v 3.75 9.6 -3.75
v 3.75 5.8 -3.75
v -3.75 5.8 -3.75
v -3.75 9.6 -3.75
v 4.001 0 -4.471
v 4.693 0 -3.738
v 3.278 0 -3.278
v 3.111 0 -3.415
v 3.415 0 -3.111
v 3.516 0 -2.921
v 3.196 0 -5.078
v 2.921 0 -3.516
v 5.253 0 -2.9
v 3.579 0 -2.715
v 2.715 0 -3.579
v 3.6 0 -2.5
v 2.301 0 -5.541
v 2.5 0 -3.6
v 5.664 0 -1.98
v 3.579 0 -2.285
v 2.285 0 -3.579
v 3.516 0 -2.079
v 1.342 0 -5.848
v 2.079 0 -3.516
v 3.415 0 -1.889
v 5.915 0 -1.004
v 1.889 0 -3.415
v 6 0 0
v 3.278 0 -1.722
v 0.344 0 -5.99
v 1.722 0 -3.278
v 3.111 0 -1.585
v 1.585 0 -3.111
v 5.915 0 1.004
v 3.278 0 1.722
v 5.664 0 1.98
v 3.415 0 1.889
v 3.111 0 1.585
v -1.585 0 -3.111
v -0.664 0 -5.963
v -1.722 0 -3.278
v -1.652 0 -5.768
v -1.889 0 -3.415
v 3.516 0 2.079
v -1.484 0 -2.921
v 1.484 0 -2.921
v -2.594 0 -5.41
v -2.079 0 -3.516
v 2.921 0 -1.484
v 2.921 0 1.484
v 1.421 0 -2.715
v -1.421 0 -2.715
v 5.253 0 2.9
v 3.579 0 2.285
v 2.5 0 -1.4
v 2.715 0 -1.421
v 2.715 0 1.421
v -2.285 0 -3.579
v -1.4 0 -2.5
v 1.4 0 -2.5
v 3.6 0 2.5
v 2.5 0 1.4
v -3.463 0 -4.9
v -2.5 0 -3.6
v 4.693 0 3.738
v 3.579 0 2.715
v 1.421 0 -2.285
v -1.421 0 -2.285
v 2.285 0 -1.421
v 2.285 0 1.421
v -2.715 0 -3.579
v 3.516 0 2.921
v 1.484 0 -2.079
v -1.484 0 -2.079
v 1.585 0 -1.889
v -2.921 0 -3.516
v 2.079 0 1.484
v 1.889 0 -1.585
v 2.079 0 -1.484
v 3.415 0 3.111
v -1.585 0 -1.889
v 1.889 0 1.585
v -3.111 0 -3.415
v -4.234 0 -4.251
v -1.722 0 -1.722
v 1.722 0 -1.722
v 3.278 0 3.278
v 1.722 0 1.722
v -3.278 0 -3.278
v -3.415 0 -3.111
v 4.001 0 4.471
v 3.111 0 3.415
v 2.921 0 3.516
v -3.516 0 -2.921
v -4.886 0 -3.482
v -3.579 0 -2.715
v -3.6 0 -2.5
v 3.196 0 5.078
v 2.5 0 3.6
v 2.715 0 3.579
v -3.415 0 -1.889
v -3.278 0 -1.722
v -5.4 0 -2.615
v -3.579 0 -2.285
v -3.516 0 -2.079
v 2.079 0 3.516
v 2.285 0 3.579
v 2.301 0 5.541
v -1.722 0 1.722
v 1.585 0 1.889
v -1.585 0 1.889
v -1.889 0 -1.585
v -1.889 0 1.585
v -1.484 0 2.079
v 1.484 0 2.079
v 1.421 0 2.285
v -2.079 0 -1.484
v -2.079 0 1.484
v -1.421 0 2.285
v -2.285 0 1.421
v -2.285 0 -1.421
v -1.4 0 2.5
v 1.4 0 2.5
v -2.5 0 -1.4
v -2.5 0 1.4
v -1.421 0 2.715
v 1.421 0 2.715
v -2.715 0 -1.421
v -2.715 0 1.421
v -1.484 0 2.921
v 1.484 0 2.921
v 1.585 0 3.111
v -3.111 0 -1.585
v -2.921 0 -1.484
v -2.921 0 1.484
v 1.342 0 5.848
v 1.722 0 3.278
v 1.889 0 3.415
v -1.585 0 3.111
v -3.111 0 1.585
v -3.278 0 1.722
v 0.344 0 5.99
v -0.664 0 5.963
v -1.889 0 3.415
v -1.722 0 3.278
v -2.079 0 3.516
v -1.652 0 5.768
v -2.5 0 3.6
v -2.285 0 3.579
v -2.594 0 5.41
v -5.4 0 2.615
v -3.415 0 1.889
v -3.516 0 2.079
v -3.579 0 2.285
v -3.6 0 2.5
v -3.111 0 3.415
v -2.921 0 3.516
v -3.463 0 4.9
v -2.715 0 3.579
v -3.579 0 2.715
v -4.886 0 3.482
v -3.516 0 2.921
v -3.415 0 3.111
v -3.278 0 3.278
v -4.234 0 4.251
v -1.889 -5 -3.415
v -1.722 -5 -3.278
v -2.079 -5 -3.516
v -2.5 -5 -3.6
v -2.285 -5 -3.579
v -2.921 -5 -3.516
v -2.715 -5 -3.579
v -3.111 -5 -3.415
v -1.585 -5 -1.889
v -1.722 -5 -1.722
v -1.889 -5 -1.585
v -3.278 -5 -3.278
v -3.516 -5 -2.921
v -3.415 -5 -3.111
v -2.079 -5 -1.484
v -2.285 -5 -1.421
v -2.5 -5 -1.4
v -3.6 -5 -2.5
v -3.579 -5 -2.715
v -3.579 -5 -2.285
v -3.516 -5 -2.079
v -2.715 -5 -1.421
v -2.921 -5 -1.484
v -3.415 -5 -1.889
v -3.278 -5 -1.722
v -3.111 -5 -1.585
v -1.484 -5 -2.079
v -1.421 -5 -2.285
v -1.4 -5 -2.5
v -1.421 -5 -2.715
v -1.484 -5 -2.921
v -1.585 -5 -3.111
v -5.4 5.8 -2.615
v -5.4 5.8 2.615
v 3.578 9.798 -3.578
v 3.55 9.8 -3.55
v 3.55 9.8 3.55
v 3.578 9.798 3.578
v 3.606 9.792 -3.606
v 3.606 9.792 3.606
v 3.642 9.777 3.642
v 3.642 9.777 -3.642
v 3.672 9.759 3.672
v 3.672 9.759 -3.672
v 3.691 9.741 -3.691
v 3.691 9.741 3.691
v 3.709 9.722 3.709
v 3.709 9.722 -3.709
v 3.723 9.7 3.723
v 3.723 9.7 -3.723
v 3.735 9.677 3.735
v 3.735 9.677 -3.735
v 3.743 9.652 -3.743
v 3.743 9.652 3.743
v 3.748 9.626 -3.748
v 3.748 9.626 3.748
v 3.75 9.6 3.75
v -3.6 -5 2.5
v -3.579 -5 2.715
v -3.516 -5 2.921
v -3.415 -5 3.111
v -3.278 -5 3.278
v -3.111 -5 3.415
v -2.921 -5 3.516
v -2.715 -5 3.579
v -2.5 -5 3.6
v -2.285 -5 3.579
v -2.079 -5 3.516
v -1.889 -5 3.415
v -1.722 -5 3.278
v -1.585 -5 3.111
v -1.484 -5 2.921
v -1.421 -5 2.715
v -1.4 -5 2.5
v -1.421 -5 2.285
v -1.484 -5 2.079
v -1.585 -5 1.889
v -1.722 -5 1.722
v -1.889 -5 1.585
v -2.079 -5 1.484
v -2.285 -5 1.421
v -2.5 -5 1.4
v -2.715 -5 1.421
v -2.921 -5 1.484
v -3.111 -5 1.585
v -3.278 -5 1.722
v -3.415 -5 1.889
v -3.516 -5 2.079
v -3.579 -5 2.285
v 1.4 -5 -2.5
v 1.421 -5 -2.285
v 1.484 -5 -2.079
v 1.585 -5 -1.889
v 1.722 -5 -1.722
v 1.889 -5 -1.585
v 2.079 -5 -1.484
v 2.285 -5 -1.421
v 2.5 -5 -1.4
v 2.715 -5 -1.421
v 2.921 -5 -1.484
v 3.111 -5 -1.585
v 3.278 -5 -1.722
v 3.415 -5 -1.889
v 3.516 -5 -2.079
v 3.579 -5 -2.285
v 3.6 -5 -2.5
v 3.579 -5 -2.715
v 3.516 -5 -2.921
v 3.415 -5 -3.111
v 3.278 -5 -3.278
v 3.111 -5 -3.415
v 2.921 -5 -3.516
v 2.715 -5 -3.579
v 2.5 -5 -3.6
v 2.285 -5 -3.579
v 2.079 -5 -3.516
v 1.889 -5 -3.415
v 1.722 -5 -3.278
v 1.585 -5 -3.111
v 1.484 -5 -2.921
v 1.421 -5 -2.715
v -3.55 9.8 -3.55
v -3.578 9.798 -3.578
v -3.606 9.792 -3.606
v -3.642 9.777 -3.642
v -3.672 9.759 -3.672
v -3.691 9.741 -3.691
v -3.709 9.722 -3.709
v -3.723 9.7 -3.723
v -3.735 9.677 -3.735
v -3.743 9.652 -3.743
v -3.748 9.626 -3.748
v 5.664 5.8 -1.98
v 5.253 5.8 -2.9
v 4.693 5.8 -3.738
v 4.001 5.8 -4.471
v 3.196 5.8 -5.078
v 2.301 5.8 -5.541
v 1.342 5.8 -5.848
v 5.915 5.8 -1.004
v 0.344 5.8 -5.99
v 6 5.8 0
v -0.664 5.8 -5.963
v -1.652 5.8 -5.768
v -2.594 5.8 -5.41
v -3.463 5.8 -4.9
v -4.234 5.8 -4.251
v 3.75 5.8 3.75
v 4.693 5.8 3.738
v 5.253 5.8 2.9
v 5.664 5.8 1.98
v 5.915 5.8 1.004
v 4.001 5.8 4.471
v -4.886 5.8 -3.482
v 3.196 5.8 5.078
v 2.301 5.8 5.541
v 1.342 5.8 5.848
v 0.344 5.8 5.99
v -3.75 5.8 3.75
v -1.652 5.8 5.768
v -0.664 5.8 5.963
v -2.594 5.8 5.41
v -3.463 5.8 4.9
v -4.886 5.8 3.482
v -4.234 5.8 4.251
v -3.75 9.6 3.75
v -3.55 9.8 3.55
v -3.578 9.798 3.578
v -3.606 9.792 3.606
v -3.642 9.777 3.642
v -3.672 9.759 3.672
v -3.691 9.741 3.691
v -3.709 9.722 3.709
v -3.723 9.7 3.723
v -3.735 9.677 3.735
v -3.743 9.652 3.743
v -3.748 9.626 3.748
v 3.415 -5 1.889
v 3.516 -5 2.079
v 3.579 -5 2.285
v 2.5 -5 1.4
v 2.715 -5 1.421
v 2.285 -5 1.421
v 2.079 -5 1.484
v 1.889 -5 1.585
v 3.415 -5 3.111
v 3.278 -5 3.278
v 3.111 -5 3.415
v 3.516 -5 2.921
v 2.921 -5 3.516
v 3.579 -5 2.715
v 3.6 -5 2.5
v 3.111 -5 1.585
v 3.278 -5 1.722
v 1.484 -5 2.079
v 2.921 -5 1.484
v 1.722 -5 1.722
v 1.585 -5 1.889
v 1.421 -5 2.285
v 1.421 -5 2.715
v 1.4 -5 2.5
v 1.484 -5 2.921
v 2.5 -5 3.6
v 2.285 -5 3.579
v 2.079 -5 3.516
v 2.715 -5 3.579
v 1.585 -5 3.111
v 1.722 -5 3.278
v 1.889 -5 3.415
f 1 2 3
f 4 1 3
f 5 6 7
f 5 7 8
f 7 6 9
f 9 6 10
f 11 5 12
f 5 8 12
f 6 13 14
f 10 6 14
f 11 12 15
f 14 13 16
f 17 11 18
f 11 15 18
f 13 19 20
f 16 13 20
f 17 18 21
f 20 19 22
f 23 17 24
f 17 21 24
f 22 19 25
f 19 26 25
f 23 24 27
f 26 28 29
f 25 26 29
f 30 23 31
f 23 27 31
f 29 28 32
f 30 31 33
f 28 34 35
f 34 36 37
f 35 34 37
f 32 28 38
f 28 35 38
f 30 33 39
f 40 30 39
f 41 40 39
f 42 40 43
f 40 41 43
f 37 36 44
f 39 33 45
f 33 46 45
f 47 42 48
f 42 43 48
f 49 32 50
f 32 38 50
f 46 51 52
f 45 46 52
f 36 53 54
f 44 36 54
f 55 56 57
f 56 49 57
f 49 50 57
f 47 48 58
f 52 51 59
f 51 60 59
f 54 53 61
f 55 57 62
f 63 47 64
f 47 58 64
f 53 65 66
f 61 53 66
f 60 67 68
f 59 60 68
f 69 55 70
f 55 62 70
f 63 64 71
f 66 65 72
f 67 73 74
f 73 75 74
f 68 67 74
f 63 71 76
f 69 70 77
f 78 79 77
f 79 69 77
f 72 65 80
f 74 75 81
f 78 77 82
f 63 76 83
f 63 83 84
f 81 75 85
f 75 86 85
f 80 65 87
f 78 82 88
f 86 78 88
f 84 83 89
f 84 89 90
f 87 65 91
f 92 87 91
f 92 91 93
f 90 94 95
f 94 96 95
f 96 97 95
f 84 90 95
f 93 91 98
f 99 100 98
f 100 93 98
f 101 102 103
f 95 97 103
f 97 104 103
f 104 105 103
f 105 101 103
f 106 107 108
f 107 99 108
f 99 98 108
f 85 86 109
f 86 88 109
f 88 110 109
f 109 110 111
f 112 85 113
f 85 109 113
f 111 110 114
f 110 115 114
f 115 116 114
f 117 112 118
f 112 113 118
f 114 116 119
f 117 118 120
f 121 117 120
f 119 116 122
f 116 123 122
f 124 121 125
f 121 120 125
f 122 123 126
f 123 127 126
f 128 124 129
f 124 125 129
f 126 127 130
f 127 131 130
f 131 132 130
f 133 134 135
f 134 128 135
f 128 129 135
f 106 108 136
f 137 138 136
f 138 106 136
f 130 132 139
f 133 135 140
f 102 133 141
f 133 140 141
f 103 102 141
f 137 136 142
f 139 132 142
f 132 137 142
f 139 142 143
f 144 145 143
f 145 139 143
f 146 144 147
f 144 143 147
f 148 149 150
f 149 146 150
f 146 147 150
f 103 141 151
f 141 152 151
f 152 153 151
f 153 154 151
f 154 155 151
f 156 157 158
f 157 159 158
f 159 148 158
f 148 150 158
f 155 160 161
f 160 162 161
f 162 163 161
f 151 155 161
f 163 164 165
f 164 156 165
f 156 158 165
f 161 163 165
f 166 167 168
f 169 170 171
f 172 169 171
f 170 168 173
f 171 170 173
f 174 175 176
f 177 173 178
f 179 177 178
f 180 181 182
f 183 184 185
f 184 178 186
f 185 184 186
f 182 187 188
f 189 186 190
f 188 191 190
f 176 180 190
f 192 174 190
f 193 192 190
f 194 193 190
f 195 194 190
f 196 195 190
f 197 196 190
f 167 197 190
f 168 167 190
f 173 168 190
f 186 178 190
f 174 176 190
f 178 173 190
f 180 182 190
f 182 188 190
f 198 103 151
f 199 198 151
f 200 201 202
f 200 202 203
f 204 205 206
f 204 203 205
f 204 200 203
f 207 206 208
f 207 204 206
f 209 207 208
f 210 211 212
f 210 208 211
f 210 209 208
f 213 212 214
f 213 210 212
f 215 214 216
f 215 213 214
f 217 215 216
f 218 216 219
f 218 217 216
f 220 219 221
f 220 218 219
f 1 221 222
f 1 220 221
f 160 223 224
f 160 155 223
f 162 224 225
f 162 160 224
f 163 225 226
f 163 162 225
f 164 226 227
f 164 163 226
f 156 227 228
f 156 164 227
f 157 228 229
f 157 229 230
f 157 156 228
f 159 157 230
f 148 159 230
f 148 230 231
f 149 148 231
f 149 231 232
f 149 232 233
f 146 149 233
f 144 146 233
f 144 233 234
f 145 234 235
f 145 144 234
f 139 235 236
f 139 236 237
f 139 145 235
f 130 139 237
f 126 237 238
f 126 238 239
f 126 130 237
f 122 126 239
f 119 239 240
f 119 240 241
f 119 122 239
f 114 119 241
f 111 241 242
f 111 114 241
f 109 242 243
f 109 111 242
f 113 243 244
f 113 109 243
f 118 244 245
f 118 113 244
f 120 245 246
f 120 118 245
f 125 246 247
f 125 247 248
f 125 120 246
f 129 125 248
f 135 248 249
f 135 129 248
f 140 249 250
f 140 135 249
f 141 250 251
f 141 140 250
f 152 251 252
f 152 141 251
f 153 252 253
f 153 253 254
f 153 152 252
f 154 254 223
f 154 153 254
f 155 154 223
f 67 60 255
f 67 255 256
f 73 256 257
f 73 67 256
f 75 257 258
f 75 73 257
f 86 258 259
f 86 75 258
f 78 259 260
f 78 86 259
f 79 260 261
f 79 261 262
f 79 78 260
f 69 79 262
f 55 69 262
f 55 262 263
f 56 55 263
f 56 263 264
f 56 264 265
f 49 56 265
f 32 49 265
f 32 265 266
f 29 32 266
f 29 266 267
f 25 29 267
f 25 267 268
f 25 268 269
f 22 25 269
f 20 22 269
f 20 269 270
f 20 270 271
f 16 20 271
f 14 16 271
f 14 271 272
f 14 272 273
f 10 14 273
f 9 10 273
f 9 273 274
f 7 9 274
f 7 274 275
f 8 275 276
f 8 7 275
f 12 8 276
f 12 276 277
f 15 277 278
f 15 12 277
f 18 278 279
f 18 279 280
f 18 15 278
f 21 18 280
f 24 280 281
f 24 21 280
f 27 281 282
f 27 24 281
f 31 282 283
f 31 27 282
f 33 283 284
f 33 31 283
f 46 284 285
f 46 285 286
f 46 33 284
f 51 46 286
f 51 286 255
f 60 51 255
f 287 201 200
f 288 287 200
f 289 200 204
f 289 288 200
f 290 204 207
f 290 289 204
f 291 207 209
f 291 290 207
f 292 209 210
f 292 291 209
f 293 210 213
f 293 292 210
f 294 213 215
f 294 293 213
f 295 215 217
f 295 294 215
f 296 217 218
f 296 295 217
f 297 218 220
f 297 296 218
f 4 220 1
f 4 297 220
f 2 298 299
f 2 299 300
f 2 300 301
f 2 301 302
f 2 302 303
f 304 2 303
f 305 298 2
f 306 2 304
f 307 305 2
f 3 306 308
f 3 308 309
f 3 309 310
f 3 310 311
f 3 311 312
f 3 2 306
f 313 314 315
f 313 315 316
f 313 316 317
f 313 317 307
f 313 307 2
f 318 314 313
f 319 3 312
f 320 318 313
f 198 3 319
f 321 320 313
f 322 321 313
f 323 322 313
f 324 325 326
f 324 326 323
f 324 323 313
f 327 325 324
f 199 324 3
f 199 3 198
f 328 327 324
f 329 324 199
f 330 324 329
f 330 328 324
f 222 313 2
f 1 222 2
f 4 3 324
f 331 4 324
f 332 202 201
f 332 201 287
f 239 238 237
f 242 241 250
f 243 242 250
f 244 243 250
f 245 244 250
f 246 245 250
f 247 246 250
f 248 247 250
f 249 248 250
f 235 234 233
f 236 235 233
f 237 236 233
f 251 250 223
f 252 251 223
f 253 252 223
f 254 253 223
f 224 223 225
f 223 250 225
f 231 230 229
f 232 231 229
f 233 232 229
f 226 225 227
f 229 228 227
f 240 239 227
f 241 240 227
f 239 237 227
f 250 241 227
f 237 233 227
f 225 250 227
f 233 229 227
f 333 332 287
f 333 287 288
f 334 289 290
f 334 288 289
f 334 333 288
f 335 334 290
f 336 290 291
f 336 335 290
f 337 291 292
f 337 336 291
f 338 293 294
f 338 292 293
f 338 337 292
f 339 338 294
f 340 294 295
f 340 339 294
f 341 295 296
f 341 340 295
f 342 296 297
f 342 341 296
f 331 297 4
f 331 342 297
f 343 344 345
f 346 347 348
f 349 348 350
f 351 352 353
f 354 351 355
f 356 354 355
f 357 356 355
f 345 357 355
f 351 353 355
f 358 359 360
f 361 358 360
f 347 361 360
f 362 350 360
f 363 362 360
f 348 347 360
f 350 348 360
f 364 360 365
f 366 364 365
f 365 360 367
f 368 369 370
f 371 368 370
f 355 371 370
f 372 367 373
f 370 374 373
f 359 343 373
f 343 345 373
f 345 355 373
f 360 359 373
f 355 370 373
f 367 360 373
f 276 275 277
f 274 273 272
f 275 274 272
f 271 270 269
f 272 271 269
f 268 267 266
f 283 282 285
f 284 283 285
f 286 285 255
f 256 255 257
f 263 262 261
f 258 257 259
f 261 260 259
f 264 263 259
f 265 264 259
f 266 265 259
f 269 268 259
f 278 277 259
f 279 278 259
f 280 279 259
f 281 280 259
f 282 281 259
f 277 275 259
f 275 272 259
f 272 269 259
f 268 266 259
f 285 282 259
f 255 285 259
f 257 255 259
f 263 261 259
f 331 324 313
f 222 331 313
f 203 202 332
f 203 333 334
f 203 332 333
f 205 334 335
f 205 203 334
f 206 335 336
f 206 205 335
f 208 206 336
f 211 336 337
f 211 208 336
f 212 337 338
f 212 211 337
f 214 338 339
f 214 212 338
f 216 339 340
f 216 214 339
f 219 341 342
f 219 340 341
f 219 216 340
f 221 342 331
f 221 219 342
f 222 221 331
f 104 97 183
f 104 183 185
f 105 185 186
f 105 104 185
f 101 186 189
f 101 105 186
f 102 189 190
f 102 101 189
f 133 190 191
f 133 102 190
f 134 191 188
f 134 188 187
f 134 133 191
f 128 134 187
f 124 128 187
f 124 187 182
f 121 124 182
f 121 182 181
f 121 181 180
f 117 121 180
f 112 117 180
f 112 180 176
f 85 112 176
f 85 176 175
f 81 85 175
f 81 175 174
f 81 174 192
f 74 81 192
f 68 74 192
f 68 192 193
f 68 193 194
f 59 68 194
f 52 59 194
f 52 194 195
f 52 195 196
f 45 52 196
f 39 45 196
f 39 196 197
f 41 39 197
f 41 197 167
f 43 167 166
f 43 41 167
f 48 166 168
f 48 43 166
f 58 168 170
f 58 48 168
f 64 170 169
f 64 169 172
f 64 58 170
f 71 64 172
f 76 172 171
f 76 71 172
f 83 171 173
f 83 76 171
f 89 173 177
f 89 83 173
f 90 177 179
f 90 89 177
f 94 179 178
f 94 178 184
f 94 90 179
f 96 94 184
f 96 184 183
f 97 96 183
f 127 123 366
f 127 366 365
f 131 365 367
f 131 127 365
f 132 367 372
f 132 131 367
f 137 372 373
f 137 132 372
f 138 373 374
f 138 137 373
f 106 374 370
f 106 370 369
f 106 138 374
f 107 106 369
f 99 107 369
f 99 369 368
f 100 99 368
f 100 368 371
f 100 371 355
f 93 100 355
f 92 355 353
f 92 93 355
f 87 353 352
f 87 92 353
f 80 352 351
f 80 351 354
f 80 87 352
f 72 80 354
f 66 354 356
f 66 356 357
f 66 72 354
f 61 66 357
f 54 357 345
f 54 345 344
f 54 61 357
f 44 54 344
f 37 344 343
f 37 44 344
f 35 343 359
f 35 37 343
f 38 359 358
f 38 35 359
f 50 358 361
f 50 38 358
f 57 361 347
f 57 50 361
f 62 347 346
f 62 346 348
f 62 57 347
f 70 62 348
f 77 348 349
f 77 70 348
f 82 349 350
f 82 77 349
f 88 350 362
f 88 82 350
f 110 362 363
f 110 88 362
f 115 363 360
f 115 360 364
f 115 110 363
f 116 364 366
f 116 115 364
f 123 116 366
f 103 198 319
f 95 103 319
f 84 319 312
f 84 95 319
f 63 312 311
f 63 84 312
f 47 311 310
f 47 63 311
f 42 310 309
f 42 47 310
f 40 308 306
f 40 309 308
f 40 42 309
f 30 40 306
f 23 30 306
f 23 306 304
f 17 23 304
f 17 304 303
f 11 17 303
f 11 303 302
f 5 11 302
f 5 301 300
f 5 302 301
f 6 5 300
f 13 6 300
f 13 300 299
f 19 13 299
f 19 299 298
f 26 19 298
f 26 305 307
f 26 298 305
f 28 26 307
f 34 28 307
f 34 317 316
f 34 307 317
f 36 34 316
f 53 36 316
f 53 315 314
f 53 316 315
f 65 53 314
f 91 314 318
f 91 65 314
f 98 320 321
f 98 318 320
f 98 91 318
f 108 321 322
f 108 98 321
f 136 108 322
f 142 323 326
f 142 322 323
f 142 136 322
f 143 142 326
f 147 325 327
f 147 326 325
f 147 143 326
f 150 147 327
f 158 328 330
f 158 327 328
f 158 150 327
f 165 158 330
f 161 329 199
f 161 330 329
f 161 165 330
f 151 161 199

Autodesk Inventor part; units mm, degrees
ref_plane "YZ Plane" through (0, 0, 0) normal (1, 0, 0) x (0, 1, 0)
ref_plane "XZ Plane" through (0, 0, 0) normal (0, 1, 0) x (-1, 0, 0)
ref_plane "XY Plane" through (0, 0, 0) normal (0, 0, 1) x (1, 0, 0)
sketch "Sketch1" plane through (0, 0, 0) normal (0, 1, 0) x (-1, 0, 0)
  arc A0 (5.4, 2.6153) -> (5.4, -2.6153) centre (0, 0) ccw
  line L0 (3.75, 3.75) -> (-3.75, 3.75)
  line L1 (-3.75, 3.75) -> (-3.75, -3.75)
  line L2 (-3.75, -3.75) -> (3.75, -3.75)
  line L3 (3.75, -3.75) -> (3.75, 3.75)
  line L4 (3.75, 3.75) -> (-3.75, -3.75) construction
  line L5 (-3.75, 3.75) -> (3.75, -3.75) construction
  line L6 (5.4, -2.6153) -> (5.4, 2.6153)
  circle A1 centre (2.5, 2.5) radius 1.1
  circle A2 centre (2.5, -2.5) radius 1.1
  circle A3 centre (-2.5, 2.5) radius 1.1
  circle A4 centre (-2.5, -2.5) radius 1.1
  point P0 (-6, 0)
  dimension "d0" = 12
  dimension "d1" = 7.5
  dimension "d2" = 7.5
  dimension "d3" = 11.4
  dimension "d4" = 2.2
  dimension "d7" = 5
  dimension "d10" = 5
extrude "Extrusion1" add sketch "Sketch1" along normal blind 5.8 contours L6 A0
extrude "Extrusion2" add sketch "Sketch1" along normal blind 9.8 contours L3 L2 L1 L0 | A1 | A2 | A3 | A4
extrude "Extrusion3" add sketch "Sketch1" against normal blind 5 contours A1 | A2 | A3 | A4
fillet "Fillet1" radius 0.2 4 edges at (0, 9.8, -3.75) (-3.75, 9.8, 0) (0, 9.8, 3.75) (3.75, 9.8, 0)
properties part number "D6C90 F1 LFS"
